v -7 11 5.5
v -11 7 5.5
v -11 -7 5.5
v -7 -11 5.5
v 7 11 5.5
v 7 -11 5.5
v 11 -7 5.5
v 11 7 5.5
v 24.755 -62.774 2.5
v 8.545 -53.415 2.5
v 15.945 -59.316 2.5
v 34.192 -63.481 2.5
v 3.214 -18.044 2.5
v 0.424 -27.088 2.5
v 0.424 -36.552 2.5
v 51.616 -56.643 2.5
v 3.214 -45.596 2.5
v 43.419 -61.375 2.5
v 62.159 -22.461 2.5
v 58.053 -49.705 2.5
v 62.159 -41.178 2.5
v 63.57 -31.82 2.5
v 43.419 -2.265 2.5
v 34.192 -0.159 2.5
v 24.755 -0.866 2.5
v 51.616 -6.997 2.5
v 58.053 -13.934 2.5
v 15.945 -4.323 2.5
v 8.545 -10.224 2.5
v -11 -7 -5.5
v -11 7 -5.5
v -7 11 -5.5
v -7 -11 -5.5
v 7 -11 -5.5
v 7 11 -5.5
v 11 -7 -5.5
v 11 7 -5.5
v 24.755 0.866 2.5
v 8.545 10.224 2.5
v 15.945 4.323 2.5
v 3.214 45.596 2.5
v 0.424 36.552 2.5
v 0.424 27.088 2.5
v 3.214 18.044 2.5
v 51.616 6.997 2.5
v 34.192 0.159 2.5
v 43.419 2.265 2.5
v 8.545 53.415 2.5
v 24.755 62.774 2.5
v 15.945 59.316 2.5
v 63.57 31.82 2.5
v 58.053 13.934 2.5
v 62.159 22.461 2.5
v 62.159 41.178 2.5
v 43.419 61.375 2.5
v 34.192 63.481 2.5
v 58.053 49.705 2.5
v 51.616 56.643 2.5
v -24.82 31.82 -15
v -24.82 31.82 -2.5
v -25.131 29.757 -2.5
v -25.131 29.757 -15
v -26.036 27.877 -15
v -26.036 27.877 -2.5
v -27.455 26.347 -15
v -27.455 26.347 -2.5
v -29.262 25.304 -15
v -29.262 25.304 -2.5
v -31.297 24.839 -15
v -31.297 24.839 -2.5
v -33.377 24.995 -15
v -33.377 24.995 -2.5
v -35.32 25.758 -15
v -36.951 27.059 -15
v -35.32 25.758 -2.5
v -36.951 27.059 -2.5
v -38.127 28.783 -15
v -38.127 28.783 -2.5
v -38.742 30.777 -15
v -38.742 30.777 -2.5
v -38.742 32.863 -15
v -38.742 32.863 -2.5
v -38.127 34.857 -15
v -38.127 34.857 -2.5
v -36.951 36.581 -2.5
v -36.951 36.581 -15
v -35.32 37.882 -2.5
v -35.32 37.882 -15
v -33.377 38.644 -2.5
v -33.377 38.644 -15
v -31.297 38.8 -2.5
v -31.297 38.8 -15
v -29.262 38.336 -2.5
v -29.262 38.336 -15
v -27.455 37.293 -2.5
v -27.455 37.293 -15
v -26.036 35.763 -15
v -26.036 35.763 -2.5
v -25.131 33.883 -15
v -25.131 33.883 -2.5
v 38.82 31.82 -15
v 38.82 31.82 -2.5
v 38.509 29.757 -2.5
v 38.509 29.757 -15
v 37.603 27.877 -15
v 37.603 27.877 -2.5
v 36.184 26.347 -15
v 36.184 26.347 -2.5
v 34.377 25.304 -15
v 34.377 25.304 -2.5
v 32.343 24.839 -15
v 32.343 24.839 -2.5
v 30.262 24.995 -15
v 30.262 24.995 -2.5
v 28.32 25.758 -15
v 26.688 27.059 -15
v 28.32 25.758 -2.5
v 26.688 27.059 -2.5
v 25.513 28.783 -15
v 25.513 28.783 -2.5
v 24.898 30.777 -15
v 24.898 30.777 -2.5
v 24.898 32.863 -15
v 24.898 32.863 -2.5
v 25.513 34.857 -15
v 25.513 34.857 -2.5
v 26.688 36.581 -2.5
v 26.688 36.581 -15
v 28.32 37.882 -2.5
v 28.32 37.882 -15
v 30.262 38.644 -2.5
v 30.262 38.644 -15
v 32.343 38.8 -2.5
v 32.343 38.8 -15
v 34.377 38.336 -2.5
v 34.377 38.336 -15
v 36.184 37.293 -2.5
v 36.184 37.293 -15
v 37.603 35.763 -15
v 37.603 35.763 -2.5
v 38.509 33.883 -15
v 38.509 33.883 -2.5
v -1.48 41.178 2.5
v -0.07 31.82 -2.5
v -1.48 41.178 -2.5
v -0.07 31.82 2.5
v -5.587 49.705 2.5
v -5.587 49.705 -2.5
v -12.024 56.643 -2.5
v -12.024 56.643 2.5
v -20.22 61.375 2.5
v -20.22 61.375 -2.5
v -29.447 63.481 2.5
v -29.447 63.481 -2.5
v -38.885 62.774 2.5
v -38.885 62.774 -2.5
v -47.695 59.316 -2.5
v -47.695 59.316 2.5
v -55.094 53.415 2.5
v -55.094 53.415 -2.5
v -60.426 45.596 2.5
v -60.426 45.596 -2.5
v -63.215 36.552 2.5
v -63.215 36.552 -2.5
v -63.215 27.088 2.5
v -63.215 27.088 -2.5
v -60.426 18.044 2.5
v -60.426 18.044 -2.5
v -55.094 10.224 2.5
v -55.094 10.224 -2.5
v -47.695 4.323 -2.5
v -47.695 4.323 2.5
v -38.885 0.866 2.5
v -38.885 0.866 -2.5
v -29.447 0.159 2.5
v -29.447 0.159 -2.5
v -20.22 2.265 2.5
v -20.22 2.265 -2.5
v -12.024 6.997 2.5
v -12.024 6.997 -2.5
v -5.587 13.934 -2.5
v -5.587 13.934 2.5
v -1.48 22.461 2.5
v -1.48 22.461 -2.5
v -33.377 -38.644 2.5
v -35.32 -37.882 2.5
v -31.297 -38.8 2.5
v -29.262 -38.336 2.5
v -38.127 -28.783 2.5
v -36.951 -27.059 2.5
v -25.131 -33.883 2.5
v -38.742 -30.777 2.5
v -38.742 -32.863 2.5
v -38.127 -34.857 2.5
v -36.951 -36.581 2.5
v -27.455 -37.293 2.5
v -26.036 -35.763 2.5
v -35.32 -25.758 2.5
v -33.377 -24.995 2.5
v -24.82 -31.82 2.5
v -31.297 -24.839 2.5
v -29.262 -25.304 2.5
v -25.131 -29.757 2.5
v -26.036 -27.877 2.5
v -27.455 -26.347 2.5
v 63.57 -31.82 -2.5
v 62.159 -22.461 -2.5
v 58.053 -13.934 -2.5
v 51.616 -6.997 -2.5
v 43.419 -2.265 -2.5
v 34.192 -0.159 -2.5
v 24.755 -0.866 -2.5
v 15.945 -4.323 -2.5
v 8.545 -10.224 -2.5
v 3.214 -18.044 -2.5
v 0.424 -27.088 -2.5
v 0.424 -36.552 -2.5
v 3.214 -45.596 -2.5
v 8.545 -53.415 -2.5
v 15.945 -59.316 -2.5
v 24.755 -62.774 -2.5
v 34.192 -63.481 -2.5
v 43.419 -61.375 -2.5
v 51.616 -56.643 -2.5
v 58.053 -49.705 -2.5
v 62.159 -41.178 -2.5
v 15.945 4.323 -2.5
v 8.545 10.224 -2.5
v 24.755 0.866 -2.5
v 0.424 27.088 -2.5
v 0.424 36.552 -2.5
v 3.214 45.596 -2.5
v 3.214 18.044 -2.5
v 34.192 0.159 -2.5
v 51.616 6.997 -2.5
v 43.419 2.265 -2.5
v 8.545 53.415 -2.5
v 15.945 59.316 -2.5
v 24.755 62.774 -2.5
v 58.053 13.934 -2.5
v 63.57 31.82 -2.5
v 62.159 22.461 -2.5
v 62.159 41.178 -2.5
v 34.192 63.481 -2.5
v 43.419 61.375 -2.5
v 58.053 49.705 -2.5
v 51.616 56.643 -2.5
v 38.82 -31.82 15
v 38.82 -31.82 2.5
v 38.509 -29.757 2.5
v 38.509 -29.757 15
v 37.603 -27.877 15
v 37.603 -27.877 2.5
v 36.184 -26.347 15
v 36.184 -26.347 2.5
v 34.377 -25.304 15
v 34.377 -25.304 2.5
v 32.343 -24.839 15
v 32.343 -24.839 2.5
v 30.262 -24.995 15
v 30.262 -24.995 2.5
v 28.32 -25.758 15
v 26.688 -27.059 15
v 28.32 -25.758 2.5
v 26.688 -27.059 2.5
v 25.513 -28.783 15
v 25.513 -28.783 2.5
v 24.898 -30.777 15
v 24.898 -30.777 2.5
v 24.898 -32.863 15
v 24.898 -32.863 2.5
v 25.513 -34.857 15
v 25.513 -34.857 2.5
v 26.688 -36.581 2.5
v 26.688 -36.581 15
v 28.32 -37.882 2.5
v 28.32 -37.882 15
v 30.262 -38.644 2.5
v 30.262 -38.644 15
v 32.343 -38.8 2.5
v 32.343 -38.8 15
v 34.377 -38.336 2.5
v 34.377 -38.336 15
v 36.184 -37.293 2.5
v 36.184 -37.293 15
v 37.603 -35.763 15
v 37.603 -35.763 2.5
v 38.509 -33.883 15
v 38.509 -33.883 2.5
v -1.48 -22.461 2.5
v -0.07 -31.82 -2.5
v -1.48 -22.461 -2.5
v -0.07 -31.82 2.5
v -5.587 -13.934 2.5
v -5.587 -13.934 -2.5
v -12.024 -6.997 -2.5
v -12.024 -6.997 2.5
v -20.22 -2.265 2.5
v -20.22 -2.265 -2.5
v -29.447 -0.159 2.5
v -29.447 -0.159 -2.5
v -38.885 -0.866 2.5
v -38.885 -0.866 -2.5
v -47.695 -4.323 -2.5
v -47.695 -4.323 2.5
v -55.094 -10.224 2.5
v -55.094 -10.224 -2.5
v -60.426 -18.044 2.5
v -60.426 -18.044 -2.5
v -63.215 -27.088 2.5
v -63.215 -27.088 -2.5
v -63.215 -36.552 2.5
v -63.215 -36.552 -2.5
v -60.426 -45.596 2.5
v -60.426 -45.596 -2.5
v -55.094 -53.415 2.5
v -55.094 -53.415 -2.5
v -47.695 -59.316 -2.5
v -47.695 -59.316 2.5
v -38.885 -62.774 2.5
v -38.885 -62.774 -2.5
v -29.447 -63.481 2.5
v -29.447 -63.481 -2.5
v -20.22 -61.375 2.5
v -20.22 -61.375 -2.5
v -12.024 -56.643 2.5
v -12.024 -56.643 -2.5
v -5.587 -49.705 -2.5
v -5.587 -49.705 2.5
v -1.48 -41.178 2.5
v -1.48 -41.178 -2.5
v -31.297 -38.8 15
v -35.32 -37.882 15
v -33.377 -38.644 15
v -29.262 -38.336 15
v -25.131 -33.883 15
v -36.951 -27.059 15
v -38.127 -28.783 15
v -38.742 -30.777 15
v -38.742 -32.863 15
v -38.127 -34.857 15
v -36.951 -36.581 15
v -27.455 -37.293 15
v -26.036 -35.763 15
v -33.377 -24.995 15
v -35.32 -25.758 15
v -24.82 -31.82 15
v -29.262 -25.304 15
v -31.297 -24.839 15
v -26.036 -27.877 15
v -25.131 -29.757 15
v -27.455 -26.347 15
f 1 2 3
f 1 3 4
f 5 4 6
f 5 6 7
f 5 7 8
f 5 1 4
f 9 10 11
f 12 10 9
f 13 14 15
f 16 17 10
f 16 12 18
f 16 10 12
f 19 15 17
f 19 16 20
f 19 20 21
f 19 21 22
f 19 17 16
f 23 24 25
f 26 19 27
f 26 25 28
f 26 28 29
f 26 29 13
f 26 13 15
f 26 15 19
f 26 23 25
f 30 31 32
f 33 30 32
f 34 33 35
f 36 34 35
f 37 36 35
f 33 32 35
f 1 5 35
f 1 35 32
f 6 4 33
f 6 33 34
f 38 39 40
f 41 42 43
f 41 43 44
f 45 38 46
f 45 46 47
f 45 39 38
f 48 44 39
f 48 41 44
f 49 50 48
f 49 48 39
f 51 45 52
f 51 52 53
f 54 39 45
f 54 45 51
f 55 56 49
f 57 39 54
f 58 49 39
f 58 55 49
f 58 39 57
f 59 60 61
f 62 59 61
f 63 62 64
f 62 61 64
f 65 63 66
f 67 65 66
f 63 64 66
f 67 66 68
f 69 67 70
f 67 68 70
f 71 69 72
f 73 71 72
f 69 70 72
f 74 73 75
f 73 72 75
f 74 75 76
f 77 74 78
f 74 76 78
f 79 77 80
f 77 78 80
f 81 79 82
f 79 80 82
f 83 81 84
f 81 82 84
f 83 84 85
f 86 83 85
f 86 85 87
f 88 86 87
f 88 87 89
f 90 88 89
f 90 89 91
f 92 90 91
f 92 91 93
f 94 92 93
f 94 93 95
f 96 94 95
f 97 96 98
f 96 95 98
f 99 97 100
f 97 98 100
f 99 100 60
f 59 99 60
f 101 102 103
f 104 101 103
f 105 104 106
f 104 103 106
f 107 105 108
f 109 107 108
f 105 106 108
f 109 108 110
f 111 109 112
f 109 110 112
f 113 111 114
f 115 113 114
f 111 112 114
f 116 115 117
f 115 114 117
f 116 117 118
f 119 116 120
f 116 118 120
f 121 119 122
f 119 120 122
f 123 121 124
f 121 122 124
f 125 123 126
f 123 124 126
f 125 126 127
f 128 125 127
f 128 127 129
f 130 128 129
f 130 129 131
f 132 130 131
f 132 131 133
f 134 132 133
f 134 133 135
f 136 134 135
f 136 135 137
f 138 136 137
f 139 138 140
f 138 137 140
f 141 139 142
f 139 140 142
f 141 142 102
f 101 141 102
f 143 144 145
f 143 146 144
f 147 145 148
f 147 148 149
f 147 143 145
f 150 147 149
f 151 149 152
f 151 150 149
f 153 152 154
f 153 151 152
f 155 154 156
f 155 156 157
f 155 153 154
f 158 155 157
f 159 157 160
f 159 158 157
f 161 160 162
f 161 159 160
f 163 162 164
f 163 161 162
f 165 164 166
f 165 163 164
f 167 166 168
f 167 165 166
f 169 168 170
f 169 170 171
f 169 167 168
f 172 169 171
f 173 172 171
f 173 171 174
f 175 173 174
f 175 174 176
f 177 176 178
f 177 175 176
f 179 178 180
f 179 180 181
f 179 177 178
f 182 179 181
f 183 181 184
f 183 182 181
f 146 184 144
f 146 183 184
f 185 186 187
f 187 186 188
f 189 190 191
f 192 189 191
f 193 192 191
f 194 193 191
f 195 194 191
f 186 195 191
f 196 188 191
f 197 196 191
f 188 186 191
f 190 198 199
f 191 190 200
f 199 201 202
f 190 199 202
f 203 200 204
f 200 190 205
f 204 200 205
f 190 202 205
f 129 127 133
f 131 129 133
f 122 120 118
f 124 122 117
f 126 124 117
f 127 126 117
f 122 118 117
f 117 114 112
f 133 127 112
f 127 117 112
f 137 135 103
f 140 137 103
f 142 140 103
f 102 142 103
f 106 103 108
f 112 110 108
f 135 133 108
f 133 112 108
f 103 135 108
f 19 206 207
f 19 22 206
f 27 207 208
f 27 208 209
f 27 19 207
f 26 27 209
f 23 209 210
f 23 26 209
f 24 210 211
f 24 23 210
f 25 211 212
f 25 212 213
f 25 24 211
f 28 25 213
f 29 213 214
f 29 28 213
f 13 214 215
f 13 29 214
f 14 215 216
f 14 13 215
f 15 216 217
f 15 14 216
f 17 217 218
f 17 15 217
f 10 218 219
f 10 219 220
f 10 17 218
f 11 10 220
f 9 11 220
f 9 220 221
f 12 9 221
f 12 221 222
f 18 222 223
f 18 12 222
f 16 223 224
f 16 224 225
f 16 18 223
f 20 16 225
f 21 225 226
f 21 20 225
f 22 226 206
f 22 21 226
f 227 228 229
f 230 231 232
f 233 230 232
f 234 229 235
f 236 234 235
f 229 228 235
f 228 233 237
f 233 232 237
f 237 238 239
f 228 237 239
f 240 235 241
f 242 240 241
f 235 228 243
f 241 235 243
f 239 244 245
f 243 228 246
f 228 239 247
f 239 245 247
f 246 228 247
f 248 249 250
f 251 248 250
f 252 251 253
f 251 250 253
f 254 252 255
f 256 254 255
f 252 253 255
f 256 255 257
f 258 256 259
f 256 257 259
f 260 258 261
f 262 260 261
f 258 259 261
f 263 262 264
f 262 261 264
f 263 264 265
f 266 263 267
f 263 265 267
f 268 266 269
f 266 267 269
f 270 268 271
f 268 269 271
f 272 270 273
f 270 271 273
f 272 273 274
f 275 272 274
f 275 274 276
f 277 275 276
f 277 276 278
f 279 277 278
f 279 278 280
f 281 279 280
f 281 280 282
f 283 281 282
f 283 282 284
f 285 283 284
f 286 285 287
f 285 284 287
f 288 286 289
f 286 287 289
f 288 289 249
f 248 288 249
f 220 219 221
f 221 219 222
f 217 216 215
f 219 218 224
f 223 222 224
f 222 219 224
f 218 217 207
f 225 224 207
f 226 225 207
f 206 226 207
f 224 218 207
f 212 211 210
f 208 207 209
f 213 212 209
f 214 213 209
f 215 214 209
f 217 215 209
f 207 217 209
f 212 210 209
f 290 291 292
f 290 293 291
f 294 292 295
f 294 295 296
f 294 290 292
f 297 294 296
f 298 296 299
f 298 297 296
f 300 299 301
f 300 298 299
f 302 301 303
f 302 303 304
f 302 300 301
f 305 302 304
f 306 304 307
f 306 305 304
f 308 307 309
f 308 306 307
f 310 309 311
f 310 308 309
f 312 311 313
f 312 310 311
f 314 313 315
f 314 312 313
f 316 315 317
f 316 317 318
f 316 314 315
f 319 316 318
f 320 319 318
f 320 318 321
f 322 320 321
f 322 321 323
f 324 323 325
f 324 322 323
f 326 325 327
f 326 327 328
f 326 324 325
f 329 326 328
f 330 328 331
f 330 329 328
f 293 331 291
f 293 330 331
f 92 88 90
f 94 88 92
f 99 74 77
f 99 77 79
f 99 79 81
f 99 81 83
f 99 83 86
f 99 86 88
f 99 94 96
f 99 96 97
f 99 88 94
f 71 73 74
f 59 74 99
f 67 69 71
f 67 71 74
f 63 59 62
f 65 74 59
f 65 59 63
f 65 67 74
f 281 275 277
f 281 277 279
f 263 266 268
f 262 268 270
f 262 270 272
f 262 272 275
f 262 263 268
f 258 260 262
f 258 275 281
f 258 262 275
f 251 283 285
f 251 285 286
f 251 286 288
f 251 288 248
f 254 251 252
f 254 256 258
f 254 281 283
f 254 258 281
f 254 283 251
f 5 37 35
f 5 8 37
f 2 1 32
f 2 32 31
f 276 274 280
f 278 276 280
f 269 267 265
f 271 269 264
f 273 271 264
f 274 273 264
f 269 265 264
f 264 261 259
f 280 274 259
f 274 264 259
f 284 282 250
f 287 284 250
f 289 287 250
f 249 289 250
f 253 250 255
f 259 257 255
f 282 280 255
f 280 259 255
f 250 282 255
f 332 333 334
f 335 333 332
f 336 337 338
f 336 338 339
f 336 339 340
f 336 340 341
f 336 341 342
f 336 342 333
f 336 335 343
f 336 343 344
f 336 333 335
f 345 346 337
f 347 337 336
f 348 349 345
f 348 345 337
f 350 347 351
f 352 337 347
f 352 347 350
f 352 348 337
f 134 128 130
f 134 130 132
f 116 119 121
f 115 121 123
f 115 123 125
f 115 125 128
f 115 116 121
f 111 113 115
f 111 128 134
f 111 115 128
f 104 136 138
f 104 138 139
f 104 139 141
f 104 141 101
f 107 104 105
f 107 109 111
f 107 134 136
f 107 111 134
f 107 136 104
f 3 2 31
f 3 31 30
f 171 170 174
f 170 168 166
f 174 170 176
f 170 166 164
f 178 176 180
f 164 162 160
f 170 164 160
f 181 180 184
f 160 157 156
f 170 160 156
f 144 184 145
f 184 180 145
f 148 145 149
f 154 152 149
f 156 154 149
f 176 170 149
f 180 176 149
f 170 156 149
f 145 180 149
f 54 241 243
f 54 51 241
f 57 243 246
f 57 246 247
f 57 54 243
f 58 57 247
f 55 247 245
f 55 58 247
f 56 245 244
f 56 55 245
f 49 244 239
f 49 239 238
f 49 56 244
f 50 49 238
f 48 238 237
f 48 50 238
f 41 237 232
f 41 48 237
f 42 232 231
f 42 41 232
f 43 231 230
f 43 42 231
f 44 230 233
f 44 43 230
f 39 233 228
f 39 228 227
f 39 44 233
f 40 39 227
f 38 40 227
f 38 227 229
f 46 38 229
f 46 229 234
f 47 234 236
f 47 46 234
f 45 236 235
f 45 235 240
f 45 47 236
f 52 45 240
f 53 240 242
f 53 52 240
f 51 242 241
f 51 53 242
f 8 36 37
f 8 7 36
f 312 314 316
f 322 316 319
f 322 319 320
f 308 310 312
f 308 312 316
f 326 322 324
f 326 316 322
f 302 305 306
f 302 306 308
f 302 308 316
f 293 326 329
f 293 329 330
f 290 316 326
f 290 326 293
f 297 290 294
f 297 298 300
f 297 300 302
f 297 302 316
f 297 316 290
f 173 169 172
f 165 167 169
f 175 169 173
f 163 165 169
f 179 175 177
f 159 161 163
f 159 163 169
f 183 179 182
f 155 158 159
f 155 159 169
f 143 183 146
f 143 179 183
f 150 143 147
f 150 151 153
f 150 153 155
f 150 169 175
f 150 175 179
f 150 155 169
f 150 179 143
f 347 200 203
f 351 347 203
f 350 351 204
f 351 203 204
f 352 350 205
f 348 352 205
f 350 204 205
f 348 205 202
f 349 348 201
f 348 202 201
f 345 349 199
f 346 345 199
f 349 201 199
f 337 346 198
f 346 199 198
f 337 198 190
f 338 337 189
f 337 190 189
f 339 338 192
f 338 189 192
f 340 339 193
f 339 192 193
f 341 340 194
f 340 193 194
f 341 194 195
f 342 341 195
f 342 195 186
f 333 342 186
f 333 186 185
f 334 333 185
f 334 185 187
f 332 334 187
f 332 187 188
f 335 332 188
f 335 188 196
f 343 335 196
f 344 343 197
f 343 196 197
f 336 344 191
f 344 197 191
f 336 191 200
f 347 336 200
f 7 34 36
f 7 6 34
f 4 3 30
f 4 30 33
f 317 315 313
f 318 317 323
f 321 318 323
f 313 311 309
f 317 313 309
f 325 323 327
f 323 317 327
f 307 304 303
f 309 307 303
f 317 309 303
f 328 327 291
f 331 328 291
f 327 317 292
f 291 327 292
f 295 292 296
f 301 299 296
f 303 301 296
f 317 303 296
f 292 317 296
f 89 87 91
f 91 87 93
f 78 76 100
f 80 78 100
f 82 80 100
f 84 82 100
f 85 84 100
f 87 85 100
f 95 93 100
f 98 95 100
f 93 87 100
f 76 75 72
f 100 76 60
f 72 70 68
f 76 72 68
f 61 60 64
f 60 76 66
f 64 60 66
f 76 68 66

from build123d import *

# Parameters (mm, degrees)
F0_R      = 31.75
F1_DEPTH  = 2.5
F2_R      = 7
F3_DEPTH  = 12.5
F4_R      = 7
F5_DEPTH  = 12.5
F6_R      = 7
F7_DEPTH  = 12.5
F8_R      = 7
F9_DEPTH  = 12.5
F10_DEPTH = 5.5


with BuildPart() as f1:
    # F0 (on Top) → F1 (new body, symmetric)
    with BuildSketch(Plane.XY):
        with Locations((-31.8198051534, -31.8198051534)):
            Circle(F0_R)
    extrude(amount=F1_DEPTH, both=True)


with BuildPart() as f1b:
    # F0 (on Top) → F1, piece 2 (new body, symmetric)
    with BuildSketch(Plane.XY):
        with Locations((-31.8198051534, 31.8198051534)):
            Circle(F0_R)
    extrude(amount=F1_DEPTH, both=True)


with BuildPart() as f1c:
    # F0 (on Top) → F1, piece 3 (new body, symmetric)
    with BuildSketch(Plane.XY):
        with Locations((31.8198051534, 31.8198051534)):
            Circle(F0_R)
    extrude(amount=F1_DEPTH, both=True)


with BuildPart() as f1d:
    # F0 (on Top) → F1, piece 4 (new body, symmetric)
    with BuildSketch(Plane.XY):
        with Locations((31.8198051534, -31.8198051534)):
            Circle(F0_R)
    extrude(amount=F1_DEPTH, both=True)


with BuildPart() as f3:
    # F2 (on face) → F3 (new body)
    with BuildSketch(Plane.XY.offset(2.5)):
        with Locations((-31.8198051534, -31.8198051534)):
            Circle(F2_R)
    extrude(amount=F3_DEPTH)


with BuildPart() as f5:
    # F4 (on face) → F5 (new body)
    with BuildSketch(Plane.XY.offset(2.5)):
        with Locations((31.8198051534, -31.8198051534)):
            Circle(F4_R)
    extrude(amount=F5_DEPTH)


with BuildPart() as f7:
    # F6 (on face) → F7 (new body)
    with BuildSketch(Plane(origin=(0, 0, -2.5), x_dir=(1, 0, 0), z_dir=(0, 0, -1))):
        with Locations((-31.8198051534, -31.8198051534)):
            Circle(F6_R)
    extrude(amount=F7_DEPTH)


with BuildPart() as f9:
    # F8 (on face) → F9 (new body)
    with BuildSketch(Plane(origin=(0, 0, -2.5), x_dir=(1, 0, 0), z_dir=(0, 0, -1))):
        with Locations((31.8198051534, -31.8198051534)):
            Circle(F8_R)
    extrude(amount=F9_DEPTH)


with BuildPart() as f10:
    # F0 (on Top) → F10 (new body, symmetric)
    with BuildSketch(Plane.XY):
        Polygon((11, 7), (7, 11), (-7, 11), (-11, 7), (-11, -7), (-7, -11), (7, -11), (11, -7), align=None)
    extrude(amount=F10_DEPTH, both=True)


solid = Compound([f1.part, f1b.part, f1c.part, f1d.part, f3.part, f5.part, f7.part, f9.part, f10.part])
